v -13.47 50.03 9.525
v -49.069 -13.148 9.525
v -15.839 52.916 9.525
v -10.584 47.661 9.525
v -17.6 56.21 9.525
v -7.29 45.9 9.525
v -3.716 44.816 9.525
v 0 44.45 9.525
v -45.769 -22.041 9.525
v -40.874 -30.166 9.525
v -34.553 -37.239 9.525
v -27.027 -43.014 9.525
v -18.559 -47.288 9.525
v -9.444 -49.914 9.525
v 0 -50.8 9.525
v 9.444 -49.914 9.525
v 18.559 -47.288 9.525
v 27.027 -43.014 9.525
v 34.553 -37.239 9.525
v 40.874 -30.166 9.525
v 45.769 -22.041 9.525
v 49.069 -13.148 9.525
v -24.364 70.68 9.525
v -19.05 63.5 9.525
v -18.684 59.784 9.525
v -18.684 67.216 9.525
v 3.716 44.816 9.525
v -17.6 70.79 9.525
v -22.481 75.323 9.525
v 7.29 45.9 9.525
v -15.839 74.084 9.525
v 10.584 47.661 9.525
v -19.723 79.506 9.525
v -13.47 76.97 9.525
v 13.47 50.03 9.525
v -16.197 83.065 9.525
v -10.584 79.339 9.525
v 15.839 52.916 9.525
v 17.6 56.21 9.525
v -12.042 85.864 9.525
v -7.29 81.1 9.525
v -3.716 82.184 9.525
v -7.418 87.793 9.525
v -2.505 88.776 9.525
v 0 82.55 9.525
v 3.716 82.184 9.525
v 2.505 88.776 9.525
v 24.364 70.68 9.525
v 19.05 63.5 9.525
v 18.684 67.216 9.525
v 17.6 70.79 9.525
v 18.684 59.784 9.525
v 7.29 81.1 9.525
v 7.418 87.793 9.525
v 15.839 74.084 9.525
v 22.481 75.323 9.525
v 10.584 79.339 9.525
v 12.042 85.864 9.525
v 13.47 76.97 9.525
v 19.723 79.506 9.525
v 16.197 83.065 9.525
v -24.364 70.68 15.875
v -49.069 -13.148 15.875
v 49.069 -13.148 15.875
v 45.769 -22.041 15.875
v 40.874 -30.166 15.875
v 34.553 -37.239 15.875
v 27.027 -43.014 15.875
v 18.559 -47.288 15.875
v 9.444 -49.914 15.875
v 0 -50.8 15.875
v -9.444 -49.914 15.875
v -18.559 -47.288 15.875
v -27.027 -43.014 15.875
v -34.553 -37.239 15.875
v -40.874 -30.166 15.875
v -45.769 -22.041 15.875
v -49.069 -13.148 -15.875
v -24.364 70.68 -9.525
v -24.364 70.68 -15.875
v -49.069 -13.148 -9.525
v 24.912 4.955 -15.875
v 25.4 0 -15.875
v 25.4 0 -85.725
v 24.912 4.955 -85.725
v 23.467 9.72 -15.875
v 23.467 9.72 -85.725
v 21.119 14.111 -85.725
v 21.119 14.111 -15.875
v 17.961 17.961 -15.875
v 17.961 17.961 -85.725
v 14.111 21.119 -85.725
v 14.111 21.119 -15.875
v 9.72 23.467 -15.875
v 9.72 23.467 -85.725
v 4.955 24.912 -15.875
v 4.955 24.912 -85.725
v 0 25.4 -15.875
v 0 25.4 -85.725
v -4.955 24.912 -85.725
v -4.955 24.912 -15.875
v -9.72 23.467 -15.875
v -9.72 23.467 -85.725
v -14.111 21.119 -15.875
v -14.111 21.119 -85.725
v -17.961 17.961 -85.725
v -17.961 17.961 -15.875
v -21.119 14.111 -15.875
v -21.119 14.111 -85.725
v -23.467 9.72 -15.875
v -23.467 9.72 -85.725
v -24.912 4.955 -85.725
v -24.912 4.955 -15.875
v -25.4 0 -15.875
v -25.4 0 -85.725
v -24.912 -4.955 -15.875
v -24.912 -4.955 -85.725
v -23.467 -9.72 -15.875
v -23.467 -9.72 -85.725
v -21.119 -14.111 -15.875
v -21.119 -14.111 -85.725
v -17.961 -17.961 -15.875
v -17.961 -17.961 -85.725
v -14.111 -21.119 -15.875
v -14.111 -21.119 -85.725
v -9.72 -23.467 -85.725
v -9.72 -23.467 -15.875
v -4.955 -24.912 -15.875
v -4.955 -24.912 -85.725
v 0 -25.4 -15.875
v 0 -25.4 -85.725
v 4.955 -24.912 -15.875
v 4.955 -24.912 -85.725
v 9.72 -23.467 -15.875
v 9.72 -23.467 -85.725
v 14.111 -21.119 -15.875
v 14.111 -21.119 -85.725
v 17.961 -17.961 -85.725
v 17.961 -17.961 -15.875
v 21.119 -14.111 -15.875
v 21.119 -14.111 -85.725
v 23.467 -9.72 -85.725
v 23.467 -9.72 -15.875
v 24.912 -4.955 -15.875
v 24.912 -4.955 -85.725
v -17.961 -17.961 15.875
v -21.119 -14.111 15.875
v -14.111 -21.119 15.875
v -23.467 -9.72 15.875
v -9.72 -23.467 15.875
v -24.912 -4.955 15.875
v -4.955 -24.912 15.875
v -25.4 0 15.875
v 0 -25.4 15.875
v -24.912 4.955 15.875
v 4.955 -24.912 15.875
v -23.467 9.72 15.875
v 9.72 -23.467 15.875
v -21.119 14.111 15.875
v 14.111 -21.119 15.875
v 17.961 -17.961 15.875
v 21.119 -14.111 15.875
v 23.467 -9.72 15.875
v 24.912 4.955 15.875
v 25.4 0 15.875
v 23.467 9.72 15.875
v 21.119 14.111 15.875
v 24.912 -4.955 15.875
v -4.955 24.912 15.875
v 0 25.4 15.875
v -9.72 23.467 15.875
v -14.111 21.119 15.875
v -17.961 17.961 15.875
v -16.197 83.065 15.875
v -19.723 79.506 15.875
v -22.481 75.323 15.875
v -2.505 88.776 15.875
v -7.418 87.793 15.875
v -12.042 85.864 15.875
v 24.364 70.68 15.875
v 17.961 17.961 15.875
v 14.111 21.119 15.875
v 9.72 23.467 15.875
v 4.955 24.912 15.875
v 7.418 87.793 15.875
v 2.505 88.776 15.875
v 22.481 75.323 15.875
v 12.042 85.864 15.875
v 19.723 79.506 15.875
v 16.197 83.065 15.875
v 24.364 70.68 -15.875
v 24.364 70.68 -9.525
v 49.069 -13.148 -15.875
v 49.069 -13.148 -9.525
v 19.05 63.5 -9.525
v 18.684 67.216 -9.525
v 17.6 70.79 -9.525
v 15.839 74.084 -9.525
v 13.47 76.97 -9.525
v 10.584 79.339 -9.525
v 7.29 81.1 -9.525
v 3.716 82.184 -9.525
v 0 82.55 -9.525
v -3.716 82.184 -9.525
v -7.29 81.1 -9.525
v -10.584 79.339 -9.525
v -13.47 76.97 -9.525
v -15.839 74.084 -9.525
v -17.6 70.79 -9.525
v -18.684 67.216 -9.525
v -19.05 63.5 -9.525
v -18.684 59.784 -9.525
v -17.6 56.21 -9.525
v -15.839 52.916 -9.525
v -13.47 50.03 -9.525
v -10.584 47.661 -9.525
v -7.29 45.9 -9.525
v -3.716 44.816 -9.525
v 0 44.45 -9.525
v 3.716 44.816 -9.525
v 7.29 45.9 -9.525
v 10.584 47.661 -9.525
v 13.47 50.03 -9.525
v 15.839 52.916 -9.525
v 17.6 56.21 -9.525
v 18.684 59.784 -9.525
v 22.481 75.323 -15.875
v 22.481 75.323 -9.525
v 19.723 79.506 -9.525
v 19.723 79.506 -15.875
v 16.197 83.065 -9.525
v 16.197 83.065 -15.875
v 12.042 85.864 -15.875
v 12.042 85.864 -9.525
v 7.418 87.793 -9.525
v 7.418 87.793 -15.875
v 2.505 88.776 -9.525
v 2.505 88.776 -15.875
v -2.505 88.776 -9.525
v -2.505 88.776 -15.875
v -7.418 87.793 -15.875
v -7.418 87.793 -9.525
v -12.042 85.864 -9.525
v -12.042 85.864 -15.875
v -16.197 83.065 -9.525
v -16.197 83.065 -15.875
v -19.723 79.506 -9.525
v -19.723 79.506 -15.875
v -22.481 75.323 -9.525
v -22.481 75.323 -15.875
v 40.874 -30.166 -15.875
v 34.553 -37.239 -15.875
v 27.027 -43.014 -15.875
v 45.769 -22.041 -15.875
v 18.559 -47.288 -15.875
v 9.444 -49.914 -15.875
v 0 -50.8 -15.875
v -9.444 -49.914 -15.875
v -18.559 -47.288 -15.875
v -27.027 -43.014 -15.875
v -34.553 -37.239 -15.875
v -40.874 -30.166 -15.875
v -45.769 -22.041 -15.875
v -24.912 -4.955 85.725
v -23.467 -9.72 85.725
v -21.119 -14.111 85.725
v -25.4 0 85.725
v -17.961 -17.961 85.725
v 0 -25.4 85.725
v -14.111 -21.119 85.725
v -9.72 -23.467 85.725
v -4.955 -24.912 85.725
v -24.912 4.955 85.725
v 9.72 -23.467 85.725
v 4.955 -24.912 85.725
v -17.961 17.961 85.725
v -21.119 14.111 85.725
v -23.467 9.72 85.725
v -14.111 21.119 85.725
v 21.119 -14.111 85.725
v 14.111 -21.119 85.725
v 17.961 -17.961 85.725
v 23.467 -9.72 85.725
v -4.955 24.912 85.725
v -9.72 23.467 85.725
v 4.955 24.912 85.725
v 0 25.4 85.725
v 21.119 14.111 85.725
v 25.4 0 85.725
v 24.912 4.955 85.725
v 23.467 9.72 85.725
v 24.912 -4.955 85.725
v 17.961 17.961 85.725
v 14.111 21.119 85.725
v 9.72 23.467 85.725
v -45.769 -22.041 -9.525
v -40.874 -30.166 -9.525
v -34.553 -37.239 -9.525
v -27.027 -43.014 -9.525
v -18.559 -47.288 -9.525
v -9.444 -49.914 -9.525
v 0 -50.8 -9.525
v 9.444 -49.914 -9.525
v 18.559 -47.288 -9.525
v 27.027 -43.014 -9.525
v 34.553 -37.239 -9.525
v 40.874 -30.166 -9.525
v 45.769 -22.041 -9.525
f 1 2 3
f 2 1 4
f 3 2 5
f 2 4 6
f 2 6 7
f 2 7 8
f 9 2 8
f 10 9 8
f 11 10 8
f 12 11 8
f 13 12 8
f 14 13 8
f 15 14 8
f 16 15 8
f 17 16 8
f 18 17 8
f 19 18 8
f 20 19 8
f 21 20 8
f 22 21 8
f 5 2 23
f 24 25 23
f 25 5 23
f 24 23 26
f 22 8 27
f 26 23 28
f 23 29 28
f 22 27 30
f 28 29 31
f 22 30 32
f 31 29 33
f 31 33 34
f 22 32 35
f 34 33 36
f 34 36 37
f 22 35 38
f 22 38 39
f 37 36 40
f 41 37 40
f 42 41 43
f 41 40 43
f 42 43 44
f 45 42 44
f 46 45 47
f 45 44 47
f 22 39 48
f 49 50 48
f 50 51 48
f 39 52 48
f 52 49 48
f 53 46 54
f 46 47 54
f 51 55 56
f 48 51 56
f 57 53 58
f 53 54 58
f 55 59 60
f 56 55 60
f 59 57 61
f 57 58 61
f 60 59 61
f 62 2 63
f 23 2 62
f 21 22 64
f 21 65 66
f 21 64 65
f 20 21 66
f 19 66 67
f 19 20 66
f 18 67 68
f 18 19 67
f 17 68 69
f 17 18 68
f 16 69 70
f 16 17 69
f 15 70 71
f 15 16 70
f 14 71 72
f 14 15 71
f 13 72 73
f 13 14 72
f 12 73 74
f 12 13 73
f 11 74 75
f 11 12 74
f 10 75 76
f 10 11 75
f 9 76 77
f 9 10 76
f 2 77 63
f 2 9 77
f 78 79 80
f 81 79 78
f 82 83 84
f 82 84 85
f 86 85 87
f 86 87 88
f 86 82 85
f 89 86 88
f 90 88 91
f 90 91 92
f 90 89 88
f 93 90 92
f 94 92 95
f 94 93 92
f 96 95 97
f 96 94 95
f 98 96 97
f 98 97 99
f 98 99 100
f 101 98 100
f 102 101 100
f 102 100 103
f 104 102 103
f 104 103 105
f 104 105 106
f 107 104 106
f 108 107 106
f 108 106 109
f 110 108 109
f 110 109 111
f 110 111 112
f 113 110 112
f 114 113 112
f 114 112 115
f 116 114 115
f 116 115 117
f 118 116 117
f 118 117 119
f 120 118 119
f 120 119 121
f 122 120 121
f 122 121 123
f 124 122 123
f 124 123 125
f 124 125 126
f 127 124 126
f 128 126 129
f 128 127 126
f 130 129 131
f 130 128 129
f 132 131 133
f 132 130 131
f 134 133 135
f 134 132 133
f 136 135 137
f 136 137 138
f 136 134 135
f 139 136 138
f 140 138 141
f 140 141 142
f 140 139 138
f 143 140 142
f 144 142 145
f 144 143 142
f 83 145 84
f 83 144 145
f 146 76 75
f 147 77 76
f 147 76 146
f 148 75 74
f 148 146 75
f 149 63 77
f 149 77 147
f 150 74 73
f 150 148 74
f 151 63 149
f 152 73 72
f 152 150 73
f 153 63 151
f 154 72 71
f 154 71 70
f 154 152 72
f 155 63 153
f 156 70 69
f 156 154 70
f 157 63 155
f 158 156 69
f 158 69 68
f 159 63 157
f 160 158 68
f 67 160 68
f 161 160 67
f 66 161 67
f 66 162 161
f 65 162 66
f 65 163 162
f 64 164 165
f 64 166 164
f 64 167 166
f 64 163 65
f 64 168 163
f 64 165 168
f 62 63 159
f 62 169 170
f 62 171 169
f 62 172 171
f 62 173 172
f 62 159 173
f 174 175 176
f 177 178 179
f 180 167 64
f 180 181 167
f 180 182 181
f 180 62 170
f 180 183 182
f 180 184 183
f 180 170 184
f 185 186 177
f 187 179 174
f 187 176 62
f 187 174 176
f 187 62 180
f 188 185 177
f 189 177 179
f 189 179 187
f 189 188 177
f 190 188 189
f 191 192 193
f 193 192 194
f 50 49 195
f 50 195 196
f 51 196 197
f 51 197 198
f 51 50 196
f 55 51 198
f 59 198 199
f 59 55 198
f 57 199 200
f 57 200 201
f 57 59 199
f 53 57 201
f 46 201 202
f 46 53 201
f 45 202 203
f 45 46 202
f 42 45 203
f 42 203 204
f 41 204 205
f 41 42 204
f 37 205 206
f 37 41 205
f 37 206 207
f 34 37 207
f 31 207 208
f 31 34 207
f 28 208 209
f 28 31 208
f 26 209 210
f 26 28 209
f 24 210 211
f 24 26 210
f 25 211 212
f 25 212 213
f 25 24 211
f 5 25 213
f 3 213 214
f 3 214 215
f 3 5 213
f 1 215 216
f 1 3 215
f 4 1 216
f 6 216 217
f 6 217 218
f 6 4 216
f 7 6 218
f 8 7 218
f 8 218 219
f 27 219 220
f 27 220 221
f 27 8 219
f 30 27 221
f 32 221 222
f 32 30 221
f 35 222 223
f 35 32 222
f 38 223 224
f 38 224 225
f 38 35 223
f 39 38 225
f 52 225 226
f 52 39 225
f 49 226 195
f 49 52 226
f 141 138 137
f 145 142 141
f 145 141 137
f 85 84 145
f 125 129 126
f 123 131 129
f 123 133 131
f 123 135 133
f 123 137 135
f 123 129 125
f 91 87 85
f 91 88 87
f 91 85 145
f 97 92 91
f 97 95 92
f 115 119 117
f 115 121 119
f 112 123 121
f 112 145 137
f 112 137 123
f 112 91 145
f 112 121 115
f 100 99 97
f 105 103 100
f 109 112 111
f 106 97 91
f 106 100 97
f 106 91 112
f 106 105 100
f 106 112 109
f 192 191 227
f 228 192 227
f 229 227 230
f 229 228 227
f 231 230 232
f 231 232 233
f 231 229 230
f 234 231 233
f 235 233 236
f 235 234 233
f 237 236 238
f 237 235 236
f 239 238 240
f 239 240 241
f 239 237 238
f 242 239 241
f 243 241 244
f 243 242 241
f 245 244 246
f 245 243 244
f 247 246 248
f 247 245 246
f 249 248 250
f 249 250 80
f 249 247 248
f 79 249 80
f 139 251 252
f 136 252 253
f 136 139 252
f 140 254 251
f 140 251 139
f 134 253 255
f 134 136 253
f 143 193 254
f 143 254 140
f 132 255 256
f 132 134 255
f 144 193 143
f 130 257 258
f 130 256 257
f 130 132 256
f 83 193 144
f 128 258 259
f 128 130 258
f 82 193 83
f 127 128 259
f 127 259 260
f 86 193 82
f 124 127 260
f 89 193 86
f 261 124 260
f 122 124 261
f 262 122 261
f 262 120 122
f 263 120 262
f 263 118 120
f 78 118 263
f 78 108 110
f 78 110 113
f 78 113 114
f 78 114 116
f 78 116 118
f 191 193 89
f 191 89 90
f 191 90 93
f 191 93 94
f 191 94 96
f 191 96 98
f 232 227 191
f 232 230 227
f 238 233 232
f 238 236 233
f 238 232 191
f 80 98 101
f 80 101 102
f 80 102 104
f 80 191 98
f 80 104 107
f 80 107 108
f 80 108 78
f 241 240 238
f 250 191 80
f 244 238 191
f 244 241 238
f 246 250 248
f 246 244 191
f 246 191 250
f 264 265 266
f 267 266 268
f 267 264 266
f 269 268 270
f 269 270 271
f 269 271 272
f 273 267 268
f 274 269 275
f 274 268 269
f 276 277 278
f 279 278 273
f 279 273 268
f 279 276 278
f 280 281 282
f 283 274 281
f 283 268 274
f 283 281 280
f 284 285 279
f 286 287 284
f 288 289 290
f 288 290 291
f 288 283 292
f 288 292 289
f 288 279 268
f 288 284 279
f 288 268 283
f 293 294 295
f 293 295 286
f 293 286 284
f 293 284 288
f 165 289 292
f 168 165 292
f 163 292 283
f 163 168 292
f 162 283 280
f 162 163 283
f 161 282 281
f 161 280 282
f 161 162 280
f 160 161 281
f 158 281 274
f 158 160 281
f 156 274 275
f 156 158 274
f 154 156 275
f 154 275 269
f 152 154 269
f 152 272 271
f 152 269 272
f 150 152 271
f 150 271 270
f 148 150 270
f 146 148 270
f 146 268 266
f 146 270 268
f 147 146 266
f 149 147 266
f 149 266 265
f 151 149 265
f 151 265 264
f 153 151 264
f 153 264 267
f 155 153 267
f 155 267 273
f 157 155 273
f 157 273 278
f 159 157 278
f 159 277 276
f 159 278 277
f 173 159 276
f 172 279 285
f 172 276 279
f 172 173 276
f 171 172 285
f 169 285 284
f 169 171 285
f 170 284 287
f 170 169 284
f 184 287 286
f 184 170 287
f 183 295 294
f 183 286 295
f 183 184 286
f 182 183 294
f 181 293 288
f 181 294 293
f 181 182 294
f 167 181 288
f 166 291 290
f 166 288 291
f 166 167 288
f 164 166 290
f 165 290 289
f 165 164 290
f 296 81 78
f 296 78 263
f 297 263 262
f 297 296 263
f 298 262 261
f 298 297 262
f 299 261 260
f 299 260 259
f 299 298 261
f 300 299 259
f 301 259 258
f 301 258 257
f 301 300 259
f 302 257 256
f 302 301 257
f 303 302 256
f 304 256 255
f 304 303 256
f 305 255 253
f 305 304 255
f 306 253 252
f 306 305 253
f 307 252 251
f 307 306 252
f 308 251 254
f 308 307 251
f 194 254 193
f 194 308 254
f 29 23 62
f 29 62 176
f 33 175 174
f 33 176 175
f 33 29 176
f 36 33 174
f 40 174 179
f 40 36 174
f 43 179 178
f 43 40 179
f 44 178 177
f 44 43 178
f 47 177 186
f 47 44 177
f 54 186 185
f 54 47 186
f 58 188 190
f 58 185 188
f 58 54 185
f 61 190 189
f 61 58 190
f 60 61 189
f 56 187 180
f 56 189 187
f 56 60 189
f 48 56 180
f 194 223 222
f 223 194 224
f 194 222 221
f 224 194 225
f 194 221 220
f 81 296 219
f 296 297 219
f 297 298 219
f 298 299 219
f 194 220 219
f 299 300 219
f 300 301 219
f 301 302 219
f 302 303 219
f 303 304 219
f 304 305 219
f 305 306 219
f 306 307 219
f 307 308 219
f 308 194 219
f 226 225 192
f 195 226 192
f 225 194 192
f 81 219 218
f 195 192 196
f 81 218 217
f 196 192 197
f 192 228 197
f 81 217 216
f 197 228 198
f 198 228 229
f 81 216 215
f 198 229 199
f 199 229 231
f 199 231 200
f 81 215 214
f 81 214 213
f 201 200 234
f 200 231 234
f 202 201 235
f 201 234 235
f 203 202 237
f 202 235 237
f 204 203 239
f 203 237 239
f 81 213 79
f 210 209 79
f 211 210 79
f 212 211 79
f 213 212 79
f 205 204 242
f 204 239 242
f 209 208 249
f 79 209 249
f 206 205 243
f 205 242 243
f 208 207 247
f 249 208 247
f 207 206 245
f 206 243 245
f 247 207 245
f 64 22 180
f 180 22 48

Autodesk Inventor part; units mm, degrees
ref_plane "YZ Plane" through (0, 0, 0) normal (1, 0, 0) x (0, 1, 0)
ref_plane "XZ Plane" through (0, 0, 0) normal (0, 1, 0) x (-1, 0, 0)
ref_plane "XY Plane" through (0, 0, 0) normal (0, 0, 1) x (1, 0, 0)
sketch "Sketch1" plane through (0, 0, 0) normal (0, 0, 1) x (1, 0, 0)
  circle A0 centre (0, 0) radius 19.05
  circle A1 centre (0, 63.5) radius 19.05
  line L0 (0, -78.74) -> (0, 116.84) construction
  circle A2 centre (0, 63.5) radius 25.4
  circle A3 centre (0, 0) radius 25.4
  arc A4 (-49.069, -13.148) -> (49.069, -13.148) centre (0, 0) ccw
  line L1 (0, 0) -> (49.069, -13.148) construction
  line L2 (0, 0) -> (50.8, 0) construction
  line L3 (0, 0) -> (-49.069, -13.148) construction
  line L4 (-49.069, -13.148) -> (-24.364, 70.6803)
  line L5 (49.069, -13.148) -> (24.364, 70.6803)
  dimension "crank_dia" = 38.1
  dimension "d2" = 38.1
  dimension "crank_ctc" = 63.5
  dimension "crank_wt" = 6.35
  dimension "d8" = 6.35
  dimension "crank_rad" = 50.8
  dimension "d10" = 15
  dimension "d13" = 150
extrude "Extrusion1" add sketch "Sketch1" along normal blind 9.525 contours A1
extrude "Extrusion2" add sketch "Sketch1" along normal blind 6.35 from surface at 9.525 contours A1 | A2 | A2 L5 A4 L4
extrude "Extrusion3" add sketch "Sketch1" along normal blind 76.2 from surface at 9.525 contours A0 | A3
mirror "Mirror1" about plane through (0, 0, 0) normal (0, 0, 1) of "Extrusion1", "Extrusion2", "Extrusion3"
equation "\"d2\" = 2 * pin_dia"
equation "\"d8\" = crank_wt"
equation "\"pin_dia\" = 19.05"
properties part number "Crank_Shaft" material "Stainless Steel"
